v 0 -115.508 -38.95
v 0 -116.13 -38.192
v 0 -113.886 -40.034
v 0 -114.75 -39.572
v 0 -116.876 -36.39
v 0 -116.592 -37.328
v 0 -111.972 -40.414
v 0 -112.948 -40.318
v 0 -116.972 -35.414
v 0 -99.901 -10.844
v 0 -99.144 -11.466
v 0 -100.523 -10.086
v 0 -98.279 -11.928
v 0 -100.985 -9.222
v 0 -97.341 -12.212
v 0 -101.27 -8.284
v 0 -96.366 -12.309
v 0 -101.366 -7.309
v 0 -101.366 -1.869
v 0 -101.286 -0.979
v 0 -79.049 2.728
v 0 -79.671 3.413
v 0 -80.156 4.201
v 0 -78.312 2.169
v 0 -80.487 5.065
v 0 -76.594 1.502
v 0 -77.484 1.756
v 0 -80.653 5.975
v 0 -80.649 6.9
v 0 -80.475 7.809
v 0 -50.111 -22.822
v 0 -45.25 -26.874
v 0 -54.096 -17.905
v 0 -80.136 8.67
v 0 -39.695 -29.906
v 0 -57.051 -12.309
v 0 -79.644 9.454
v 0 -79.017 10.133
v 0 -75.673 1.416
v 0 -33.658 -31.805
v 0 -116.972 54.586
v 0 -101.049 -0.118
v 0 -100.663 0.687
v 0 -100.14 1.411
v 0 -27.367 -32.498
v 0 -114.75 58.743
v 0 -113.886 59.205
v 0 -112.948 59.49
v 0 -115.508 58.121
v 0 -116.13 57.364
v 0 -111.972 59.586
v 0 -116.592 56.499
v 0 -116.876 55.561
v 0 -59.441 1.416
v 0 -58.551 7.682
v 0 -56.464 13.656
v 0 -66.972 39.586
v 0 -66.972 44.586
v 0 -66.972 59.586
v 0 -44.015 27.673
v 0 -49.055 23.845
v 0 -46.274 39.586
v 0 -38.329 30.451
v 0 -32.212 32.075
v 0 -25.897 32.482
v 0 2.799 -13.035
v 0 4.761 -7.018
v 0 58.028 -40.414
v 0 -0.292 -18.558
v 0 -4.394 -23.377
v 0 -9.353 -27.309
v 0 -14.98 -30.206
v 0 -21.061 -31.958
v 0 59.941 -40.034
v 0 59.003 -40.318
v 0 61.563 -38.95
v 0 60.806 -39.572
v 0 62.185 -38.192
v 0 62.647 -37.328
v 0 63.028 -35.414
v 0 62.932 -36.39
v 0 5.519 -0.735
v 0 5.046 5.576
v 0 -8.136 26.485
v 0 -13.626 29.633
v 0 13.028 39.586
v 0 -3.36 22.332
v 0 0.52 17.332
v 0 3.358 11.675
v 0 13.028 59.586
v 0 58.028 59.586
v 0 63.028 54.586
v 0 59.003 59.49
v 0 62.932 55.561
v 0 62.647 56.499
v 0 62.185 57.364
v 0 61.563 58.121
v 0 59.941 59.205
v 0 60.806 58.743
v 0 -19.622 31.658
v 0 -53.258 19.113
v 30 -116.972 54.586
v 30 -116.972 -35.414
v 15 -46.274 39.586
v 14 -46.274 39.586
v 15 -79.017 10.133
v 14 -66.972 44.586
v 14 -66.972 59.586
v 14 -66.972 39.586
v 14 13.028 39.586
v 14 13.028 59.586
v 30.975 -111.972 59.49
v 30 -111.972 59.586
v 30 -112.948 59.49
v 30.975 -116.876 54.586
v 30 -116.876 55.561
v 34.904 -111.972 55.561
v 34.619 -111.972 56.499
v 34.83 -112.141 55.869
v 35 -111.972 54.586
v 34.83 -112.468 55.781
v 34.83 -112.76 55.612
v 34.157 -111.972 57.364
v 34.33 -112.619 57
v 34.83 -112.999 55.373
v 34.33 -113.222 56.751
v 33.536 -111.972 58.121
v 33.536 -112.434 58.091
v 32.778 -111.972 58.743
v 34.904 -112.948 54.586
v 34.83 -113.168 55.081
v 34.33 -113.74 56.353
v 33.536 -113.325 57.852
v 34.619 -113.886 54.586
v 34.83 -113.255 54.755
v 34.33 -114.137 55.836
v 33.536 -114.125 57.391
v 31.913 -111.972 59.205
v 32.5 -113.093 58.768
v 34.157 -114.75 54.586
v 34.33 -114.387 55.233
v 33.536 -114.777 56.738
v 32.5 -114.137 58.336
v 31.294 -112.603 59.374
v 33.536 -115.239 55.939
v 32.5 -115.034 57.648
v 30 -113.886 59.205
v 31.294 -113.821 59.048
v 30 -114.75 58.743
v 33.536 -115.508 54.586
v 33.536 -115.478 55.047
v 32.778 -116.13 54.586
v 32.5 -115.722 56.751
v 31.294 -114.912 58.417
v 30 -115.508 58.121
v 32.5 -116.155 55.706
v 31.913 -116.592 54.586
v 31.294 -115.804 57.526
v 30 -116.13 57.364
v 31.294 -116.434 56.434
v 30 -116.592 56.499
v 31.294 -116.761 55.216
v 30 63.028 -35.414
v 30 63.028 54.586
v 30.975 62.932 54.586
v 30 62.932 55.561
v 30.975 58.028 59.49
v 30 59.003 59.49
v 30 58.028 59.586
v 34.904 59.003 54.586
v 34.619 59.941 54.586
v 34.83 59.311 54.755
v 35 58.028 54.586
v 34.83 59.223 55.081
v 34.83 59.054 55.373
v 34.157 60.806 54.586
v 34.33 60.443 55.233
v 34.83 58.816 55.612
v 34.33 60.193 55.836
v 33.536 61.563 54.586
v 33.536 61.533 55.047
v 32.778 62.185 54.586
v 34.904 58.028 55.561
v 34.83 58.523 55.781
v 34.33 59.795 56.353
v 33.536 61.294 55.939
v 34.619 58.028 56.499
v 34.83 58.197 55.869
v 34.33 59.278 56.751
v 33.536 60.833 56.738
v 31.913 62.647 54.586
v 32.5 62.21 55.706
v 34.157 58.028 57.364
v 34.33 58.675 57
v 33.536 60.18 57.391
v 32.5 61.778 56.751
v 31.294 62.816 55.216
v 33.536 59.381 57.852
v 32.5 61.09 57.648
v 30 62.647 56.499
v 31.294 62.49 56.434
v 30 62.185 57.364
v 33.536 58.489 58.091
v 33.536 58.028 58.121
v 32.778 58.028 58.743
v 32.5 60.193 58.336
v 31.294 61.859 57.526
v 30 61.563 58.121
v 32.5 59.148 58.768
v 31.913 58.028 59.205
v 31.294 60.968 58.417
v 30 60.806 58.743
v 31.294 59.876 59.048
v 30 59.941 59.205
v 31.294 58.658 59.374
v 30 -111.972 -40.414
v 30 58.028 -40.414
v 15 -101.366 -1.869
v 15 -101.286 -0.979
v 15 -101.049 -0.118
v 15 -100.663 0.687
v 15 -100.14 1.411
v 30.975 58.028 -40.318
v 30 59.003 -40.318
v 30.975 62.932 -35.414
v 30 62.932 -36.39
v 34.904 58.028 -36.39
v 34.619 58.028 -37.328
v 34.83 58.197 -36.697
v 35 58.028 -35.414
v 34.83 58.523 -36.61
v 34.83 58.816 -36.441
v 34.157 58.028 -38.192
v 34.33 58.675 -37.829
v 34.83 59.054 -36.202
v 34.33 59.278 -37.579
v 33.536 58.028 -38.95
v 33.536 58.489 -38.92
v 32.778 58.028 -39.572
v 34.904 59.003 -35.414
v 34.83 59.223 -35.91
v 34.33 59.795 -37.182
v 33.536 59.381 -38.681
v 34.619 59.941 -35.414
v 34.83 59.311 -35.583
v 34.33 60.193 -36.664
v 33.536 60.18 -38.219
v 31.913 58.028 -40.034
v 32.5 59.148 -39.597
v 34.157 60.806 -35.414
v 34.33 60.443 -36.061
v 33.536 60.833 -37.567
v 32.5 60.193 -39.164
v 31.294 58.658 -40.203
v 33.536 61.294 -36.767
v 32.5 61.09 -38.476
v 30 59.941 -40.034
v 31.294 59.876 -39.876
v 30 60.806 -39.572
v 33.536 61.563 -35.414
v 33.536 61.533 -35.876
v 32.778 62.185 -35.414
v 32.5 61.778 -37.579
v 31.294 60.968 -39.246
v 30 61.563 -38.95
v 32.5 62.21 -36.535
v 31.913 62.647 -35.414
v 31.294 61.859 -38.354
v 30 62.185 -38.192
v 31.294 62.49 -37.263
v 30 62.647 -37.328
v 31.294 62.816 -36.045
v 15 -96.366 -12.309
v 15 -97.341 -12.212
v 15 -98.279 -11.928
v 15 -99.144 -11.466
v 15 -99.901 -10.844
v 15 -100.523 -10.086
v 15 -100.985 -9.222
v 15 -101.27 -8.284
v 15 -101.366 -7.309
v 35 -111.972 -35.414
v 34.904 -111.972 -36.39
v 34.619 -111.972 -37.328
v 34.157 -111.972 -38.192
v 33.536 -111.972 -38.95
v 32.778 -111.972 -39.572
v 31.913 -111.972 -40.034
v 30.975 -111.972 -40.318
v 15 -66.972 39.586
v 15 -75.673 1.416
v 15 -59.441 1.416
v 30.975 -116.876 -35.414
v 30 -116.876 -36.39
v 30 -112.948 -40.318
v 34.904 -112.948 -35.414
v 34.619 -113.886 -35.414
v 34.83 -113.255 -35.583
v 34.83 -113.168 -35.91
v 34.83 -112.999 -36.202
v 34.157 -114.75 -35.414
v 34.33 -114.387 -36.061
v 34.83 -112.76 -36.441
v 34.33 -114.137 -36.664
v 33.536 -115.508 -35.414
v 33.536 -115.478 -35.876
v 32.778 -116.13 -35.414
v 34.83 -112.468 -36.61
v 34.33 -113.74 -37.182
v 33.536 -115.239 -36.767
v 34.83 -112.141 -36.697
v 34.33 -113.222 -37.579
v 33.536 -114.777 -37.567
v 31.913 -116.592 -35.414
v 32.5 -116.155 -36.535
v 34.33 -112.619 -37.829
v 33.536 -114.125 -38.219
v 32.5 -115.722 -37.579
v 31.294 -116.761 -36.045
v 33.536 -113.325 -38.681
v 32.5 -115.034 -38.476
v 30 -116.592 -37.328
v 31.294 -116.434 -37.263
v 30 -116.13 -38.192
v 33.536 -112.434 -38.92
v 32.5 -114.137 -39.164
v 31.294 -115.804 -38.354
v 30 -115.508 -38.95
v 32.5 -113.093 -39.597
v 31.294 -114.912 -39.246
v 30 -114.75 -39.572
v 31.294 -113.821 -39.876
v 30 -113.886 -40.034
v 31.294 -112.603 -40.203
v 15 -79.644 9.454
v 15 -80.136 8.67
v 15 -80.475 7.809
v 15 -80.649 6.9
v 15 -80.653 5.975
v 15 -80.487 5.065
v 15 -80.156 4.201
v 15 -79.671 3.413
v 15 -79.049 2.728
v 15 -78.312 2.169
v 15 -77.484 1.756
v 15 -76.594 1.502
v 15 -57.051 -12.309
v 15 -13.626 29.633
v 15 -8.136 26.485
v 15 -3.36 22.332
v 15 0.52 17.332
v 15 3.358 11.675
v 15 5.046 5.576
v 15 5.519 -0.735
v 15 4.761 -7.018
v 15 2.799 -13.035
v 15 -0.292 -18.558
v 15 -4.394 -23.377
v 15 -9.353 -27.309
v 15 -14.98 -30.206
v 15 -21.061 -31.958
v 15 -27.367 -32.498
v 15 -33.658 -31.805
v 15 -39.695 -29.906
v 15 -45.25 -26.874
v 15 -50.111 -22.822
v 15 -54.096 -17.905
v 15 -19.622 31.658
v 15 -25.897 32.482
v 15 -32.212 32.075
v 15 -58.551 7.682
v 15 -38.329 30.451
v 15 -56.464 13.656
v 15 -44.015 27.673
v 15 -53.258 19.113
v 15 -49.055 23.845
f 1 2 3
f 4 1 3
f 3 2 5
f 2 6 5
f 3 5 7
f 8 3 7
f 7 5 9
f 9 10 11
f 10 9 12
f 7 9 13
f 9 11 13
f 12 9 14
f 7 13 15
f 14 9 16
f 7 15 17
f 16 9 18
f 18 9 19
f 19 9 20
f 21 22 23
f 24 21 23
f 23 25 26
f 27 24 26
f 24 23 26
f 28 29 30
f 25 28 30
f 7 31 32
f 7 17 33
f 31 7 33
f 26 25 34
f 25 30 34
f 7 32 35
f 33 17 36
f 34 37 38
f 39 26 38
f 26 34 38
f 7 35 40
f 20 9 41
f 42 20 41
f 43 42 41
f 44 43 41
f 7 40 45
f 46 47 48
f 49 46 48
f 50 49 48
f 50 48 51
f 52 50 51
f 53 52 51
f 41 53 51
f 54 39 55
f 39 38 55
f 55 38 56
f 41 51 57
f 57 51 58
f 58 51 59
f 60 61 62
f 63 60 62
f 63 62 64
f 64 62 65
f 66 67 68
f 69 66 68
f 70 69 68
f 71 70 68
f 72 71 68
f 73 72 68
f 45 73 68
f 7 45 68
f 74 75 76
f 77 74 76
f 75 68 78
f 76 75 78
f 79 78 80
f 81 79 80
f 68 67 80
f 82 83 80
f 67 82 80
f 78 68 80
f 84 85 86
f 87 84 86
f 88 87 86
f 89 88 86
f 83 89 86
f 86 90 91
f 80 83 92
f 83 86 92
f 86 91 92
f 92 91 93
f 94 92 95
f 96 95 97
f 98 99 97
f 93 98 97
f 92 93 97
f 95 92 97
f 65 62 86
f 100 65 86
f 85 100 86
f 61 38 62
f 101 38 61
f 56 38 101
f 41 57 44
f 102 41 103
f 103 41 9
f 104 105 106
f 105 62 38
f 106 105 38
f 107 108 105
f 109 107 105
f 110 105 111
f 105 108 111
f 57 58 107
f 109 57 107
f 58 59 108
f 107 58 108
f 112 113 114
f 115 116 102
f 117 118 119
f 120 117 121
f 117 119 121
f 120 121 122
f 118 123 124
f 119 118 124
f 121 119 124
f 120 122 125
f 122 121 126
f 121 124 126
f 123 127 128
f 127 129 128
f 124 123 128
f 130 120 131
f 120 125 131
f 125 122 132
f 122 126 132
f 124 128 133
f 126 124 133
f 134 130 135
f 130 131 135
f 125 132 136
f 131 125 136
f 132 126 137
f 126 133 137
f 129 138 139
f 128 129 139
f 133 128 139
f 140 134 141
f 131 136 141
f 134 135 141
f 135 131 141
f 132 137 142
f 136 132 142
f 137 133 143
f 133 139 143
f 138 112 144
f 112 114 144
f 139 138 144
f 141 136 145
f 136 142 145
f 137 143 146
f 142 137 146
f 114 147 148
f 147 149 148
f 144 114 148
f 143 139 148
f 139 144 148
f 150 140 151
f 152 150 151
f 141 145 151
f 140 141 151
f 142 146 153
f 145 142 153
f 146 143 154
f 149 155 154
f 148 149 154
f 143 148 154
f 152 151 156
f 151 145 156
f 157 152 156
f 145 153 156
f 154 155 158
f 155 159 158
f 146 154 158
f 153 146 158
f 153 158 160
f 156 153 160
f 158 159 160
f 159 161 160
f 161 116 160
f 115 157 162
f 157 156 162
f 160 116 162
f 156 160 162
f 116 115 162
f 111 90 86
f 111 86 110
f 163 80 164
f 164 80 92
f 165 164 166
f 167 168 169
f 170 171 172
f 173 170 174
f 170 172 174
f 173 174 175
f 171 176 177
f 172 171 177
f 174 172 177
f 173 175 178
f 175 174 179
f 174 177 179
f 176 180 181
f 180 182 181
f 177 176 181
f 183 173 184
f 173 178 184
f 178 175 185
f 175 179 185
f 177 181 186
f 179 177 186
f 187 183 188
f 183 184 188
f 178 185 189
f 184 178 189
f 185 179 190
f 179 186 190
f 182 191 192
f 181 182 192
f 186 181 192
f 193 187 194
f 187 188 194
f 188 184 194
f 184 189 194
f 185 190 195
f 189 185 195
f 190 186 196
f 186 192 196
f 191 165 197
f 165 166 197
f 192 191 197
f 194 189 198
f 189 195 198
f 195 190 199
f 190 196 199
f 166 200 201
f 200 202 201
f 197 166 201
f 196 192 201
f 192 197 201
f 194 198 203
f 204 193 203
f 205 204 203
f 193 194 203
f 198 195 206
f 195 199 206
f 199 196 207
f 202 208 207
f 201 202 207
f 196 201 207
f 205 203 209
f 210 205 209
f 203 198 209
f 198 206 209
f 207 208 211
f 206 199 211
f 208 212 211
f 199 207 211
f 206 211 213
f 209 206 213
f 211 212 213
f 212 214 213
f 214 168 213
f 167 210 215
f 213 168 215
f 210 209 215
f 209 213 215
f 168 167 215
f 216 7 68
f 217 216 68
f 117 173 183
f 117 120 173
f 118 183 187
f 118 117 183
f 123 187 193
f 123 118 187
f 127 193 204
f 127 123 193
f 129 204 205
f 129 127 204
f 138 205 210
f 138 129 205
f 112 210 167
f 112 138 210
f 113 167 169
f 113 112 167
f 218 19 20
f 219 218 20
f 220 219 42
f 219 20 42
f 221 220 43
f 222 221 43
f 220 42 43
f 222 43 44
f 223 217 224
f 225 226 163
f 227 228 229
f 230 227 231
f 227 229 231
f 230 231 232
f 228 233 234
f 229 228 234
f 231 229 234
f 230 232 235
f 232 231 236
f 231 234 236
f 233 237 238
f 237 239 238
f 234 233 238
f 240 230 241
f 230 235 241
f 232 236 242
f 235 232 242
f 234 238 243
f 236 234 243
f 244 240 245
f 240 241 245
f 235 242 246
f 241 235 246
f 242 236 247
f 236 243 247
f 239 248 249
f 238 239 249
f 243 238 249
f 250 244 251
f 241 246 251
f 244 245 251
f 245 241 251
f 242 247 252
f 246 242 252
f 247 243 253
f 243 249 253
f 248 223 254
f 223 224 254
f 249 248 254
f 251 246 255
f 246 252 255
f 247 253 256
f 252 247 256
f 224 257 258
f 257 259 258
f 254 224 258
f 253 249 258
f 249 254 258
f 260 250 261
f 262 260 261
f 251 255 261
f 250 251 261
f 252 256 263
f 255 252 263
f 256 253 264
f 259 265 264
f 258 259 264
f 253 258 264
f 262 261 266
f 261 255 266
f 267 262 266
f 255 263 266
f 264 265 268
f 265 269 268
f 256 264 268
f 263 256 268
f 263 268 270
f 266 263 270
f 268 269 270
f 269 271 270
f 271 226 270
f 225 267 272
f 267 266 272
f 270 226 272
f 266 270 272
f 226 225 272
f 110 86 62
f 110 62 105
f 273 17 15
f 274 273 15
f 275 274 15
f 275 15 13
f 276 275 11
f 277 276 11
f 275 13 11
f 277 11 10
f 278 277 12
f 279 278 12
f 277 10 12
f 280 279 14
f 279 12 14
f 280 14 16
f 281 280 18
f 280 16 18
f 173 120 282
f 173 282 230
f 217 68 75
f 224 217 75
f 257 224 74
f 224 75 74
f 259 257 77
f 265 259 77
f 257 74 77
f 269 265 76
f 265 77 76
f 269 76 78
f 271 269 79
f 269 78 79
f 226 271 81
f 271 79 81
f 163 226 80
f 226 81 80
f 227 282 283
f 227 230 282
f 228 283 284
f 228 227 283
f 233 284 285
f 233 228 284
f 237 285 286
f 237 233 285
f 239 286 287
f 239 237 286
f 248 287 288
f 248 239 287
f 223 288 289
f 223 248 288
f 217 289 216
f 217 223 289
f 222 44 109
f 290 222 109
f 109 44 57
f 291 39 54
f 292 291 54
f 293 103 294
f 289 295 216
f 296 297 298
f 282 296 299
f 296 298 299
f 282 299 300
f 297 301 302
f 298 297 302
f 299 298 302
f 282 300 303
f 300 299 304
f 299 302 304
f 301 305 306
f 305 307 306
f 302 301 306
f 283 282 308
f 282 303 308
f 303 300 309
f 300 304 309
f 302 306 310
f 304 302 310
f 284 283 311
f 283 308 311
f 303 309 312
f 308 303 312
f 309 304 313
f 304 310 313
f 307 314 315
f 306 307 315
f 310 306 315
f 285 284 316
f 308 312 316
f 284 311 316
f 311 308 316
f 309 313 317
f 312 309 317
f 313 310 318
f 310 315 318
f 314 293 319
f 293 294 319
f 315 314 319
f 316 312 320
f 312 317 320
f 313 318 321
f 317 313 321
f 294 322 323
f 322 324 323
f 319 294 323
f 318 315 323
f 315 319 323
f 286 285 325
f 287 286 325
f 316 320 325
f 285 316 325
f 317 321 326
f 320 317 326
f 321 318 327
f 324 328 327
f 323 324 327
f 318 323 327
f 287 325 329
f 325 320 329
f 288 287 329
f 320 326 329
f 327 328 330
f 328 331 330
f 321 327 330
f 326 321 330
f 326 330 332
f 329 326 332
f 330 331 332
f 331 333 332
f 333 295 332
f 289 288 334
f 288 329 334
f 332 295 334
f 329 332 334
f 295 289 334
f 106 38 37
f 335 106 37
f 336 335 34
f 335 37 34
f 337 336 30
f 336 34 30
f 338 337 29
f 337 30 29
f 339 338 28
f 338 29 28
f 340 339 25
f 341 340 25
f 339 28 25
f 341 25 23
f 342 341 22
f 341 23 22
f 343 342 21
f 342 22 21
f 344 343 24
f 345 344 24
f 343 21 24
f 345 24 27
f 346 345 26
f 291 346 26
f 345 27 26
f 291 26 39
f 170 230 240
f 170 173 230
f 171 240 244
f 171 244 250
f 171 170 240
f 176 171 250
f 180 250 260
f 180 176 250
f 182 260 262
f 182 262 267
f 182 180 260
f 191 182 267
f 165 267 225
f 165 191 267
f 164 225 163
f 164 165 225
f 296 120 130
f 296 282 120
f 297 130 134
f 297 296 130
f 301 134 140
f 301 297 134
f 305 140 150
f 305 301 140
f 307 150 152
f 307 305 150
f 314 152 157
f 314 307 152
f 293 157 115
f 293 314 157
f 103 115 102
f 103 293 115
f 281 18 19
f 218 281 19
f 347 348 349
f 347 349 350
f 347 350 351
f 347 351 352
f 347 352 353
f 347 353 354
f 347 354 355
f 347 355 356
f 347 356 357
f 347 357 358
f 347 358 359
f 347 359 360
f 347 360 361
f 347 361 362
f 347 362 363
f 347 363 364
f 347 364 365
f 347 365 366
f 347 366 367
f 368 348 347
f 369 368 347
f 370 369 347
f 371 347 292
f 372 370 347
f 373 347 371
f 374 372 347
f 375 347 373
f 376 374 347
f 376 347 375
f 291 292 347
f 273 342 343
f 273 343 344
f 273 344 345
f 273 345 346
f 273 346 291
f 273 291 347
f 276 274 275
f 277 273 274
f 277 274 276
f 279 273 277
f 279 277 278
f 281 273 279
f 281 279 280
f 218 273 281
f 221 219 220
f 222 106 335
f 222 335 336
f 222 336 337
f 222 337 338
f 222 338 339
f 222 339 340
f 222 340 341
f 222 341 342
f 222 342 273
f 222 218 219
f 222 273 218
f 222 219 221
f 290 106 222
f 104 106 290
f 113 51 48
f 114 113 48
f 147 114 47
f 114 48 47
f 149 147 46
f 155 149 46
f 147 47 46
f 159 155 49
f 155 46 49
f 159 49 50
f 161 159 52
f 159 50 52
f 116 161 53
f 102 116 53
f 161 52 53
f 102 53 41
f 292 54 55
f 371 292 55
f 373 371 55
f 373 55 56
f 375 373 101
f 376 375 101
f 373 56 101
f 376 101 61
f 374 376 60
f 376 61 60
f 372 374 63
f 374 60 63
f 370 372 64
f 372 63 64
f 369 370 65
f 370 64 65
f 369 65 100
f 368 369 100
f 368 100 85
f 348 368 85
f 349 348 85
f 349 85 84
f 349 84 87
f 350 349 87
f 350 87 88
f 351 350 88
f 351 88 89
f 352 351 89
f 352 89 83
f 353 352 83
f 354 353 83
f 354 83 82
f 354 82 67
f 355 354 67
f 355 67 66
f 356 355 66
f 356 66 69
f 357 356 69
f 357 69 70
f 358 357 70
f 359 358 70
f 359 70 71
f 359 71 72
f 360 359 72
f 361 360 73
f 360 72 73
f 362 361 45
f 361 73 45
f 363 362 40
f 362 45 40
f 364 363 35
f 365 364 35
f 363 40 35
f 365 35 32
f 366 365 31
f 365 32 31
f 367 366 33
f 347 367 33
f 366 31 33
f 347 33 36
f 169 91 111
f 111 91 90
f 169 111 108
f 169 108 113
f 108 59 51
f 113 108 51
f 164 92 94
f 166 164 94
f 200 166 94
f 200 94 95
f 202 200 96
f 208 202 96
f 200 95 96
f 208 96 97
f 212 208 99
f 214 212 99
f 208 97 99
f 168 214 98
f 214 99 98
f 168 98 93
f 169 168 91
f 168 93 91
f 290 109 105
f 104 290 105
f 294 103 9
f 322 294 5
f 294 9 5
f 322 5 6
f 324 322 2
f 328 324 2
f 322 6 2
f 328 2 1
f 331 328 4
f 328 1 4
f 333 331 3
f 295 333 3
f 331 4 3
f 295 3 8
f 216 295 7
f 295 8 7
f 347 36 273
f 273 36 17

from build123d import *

# Parameters (mm, degrees)
F1_DEPTH  = 35
F2_W      = 14
F2_H      = 80
F3_DEPTH  = 15
F4_R      = 32.5
F5_DEPTH  = 15
F6_W      = 14
F6_H      = 66.9722852701
F7_DEPTH  = 20
F8_DEPTH  = 5
F9_R      = 5
F11_DEPTH = 15


with BuildPart() as f1:
    # F0 (on Right) → F1 (new body)
    with BuildSketch(Plane.YZ):
        with BuildLine():
            Line((58.0277147299, 59.5856680407), (-111.9722852701, 59.5856680407))
            ThreePointArc((-111.9722852701, 59.5856680407), (-115.507819176, 58.1212019466), (-116.9722852701, 54.5856680407))
            Line((-116.9722852701, 54.5856680407), (-116.9722852701, -35.4143319593))
            ThreePointArc((-116.9722852701, -35.4143319593), (-115.507819176, -38.9498658653), (-111.9722852701, -40.4143319593))
            Line((-111.9722852701, -40.4143319593), (58.0277147299, -40.4143319593))
            ThreePointArc((58.0277147299, -40.4143319593), (61.5632486359, -38.9498658653), (63.0277147299, -35.4143319593))
            Line((63.0277147299, -35.4143319593), (63.0277147299, 54.5856680407))
            ThreePointArc((63.0277147299, 54.5856680407), (61.5632486359, 58.1212019466), (58.0277147299, 59.5856680407))
        make_face()
    extrude(amount=F1_DEPTH)

    # F2 (on face) → F3 (cut)
    with BuildSketch(Plane.XY.offset(59.5856680407)):
        with Locations((7, -26.9722852701)):
            Rectangle(F2_W, F2_H)
    extrude(amount=-F3_DEPTH, mode=Mode.SUBTRACT)

    # F4 (on face) → F5 (cut)
    with BuildSketch(Plane(origin=(0, 0, 0), x_dir=(0, -1, 0), z_dir=(-1, 0, 0))):
        with Locations((26.9722852701, 0)):
            Circle(F4_R)
    extrude(amount=-F5_DEPTH, mode=Mode.SUBTRACT)

    # F6 (on face) → F7 (cut)
    with BuildSketch(Plane.XY.offset(59.5856680407)):
        with Locations((7, -33.486142635)):
            Rectangle(F6_W, F6_H)
    extrude(amount=-F7_DEPTH, mode=Mode.SUBTRACT)

    # F8 (cut): a face of the model
    f8_faces = [f1.faces().sort_by_distance(p)[0] for p in [
        (7, 6.513857365, 44.5856680407),
    ]]
    extrude(f8_faces, amount=-F8_DEPTH, mode=Mode.SUBTRACT)

    # F9
    f9_edges = [f1.edges().sort_by_distance(p)[0] for p in [
        (35, 61.563249, 58.121202),
        (35, -26.972285, 59.585668),
        (35, -115.507819, 58.121202),
        (35, -116.972285, 9.585668),
        (35, -115.507819, -38.949866),
        (35, -26.972285, -40.414332),
        (35, 61.563249, -38.949866),
        (35, 63.027715, 9.585668),
    ]]
    fillet(f9_edges, radius=F9_R)

    # F10 (on face) → F11 (cut)
    with BuildSketch(Plane(origin=(0, 0, 0), x_dir=(0, -1, 0), z_dir=(-1, 0, 0))):
        with BuildLine():
            Line((100.1400923047, 1.4106337988), (66.9722852701, 39.5856680407))
            Line((66.9722852701, 39.5856680407), (46.274099499, 39.5856680407))
            Line((46.274099499, 39.5856680407), (79.0167047111, 10.1334832275))
            ThreePointArc((79.0167047111, 10.1334832275), (80.3412411164, 4.6254181345), (75.672894817, 1.4161003589))
            Line((75.672894817, 1.4161003589), (59.4414192248, 1.4161003589))
            ThreePointArc((59.4414192248, 1.4161003589), (59.4645678425, 0.7082183525), (59.4722852701, 0))
            ThreePointArc((59.4722852701, 0), (58.8613058145, -6.2721901054), (57.0513395028, -12.3085537925))
            Line((57.0513395028, -12.3085537925), (96.3657003641, -12.3085537925))
            ThreePointArc((96.3657003641, -12.3085537925), (99.90123427, -10.8440876985), (101.3657003641, -7.3085537925))
            Line((101.3657003641, -7.3085537925), (101.3657003641, -1.8686901374))
            ThreePointArc((101.3657003641, -1.8686901374), (101.049286581, -0.1182558632), (100.1400923047, 1.4106337988))
        make_face()
    extrude(amount=-F11_DEPTH, mode=Mode.SUBTRACT)


solid = f1.part
